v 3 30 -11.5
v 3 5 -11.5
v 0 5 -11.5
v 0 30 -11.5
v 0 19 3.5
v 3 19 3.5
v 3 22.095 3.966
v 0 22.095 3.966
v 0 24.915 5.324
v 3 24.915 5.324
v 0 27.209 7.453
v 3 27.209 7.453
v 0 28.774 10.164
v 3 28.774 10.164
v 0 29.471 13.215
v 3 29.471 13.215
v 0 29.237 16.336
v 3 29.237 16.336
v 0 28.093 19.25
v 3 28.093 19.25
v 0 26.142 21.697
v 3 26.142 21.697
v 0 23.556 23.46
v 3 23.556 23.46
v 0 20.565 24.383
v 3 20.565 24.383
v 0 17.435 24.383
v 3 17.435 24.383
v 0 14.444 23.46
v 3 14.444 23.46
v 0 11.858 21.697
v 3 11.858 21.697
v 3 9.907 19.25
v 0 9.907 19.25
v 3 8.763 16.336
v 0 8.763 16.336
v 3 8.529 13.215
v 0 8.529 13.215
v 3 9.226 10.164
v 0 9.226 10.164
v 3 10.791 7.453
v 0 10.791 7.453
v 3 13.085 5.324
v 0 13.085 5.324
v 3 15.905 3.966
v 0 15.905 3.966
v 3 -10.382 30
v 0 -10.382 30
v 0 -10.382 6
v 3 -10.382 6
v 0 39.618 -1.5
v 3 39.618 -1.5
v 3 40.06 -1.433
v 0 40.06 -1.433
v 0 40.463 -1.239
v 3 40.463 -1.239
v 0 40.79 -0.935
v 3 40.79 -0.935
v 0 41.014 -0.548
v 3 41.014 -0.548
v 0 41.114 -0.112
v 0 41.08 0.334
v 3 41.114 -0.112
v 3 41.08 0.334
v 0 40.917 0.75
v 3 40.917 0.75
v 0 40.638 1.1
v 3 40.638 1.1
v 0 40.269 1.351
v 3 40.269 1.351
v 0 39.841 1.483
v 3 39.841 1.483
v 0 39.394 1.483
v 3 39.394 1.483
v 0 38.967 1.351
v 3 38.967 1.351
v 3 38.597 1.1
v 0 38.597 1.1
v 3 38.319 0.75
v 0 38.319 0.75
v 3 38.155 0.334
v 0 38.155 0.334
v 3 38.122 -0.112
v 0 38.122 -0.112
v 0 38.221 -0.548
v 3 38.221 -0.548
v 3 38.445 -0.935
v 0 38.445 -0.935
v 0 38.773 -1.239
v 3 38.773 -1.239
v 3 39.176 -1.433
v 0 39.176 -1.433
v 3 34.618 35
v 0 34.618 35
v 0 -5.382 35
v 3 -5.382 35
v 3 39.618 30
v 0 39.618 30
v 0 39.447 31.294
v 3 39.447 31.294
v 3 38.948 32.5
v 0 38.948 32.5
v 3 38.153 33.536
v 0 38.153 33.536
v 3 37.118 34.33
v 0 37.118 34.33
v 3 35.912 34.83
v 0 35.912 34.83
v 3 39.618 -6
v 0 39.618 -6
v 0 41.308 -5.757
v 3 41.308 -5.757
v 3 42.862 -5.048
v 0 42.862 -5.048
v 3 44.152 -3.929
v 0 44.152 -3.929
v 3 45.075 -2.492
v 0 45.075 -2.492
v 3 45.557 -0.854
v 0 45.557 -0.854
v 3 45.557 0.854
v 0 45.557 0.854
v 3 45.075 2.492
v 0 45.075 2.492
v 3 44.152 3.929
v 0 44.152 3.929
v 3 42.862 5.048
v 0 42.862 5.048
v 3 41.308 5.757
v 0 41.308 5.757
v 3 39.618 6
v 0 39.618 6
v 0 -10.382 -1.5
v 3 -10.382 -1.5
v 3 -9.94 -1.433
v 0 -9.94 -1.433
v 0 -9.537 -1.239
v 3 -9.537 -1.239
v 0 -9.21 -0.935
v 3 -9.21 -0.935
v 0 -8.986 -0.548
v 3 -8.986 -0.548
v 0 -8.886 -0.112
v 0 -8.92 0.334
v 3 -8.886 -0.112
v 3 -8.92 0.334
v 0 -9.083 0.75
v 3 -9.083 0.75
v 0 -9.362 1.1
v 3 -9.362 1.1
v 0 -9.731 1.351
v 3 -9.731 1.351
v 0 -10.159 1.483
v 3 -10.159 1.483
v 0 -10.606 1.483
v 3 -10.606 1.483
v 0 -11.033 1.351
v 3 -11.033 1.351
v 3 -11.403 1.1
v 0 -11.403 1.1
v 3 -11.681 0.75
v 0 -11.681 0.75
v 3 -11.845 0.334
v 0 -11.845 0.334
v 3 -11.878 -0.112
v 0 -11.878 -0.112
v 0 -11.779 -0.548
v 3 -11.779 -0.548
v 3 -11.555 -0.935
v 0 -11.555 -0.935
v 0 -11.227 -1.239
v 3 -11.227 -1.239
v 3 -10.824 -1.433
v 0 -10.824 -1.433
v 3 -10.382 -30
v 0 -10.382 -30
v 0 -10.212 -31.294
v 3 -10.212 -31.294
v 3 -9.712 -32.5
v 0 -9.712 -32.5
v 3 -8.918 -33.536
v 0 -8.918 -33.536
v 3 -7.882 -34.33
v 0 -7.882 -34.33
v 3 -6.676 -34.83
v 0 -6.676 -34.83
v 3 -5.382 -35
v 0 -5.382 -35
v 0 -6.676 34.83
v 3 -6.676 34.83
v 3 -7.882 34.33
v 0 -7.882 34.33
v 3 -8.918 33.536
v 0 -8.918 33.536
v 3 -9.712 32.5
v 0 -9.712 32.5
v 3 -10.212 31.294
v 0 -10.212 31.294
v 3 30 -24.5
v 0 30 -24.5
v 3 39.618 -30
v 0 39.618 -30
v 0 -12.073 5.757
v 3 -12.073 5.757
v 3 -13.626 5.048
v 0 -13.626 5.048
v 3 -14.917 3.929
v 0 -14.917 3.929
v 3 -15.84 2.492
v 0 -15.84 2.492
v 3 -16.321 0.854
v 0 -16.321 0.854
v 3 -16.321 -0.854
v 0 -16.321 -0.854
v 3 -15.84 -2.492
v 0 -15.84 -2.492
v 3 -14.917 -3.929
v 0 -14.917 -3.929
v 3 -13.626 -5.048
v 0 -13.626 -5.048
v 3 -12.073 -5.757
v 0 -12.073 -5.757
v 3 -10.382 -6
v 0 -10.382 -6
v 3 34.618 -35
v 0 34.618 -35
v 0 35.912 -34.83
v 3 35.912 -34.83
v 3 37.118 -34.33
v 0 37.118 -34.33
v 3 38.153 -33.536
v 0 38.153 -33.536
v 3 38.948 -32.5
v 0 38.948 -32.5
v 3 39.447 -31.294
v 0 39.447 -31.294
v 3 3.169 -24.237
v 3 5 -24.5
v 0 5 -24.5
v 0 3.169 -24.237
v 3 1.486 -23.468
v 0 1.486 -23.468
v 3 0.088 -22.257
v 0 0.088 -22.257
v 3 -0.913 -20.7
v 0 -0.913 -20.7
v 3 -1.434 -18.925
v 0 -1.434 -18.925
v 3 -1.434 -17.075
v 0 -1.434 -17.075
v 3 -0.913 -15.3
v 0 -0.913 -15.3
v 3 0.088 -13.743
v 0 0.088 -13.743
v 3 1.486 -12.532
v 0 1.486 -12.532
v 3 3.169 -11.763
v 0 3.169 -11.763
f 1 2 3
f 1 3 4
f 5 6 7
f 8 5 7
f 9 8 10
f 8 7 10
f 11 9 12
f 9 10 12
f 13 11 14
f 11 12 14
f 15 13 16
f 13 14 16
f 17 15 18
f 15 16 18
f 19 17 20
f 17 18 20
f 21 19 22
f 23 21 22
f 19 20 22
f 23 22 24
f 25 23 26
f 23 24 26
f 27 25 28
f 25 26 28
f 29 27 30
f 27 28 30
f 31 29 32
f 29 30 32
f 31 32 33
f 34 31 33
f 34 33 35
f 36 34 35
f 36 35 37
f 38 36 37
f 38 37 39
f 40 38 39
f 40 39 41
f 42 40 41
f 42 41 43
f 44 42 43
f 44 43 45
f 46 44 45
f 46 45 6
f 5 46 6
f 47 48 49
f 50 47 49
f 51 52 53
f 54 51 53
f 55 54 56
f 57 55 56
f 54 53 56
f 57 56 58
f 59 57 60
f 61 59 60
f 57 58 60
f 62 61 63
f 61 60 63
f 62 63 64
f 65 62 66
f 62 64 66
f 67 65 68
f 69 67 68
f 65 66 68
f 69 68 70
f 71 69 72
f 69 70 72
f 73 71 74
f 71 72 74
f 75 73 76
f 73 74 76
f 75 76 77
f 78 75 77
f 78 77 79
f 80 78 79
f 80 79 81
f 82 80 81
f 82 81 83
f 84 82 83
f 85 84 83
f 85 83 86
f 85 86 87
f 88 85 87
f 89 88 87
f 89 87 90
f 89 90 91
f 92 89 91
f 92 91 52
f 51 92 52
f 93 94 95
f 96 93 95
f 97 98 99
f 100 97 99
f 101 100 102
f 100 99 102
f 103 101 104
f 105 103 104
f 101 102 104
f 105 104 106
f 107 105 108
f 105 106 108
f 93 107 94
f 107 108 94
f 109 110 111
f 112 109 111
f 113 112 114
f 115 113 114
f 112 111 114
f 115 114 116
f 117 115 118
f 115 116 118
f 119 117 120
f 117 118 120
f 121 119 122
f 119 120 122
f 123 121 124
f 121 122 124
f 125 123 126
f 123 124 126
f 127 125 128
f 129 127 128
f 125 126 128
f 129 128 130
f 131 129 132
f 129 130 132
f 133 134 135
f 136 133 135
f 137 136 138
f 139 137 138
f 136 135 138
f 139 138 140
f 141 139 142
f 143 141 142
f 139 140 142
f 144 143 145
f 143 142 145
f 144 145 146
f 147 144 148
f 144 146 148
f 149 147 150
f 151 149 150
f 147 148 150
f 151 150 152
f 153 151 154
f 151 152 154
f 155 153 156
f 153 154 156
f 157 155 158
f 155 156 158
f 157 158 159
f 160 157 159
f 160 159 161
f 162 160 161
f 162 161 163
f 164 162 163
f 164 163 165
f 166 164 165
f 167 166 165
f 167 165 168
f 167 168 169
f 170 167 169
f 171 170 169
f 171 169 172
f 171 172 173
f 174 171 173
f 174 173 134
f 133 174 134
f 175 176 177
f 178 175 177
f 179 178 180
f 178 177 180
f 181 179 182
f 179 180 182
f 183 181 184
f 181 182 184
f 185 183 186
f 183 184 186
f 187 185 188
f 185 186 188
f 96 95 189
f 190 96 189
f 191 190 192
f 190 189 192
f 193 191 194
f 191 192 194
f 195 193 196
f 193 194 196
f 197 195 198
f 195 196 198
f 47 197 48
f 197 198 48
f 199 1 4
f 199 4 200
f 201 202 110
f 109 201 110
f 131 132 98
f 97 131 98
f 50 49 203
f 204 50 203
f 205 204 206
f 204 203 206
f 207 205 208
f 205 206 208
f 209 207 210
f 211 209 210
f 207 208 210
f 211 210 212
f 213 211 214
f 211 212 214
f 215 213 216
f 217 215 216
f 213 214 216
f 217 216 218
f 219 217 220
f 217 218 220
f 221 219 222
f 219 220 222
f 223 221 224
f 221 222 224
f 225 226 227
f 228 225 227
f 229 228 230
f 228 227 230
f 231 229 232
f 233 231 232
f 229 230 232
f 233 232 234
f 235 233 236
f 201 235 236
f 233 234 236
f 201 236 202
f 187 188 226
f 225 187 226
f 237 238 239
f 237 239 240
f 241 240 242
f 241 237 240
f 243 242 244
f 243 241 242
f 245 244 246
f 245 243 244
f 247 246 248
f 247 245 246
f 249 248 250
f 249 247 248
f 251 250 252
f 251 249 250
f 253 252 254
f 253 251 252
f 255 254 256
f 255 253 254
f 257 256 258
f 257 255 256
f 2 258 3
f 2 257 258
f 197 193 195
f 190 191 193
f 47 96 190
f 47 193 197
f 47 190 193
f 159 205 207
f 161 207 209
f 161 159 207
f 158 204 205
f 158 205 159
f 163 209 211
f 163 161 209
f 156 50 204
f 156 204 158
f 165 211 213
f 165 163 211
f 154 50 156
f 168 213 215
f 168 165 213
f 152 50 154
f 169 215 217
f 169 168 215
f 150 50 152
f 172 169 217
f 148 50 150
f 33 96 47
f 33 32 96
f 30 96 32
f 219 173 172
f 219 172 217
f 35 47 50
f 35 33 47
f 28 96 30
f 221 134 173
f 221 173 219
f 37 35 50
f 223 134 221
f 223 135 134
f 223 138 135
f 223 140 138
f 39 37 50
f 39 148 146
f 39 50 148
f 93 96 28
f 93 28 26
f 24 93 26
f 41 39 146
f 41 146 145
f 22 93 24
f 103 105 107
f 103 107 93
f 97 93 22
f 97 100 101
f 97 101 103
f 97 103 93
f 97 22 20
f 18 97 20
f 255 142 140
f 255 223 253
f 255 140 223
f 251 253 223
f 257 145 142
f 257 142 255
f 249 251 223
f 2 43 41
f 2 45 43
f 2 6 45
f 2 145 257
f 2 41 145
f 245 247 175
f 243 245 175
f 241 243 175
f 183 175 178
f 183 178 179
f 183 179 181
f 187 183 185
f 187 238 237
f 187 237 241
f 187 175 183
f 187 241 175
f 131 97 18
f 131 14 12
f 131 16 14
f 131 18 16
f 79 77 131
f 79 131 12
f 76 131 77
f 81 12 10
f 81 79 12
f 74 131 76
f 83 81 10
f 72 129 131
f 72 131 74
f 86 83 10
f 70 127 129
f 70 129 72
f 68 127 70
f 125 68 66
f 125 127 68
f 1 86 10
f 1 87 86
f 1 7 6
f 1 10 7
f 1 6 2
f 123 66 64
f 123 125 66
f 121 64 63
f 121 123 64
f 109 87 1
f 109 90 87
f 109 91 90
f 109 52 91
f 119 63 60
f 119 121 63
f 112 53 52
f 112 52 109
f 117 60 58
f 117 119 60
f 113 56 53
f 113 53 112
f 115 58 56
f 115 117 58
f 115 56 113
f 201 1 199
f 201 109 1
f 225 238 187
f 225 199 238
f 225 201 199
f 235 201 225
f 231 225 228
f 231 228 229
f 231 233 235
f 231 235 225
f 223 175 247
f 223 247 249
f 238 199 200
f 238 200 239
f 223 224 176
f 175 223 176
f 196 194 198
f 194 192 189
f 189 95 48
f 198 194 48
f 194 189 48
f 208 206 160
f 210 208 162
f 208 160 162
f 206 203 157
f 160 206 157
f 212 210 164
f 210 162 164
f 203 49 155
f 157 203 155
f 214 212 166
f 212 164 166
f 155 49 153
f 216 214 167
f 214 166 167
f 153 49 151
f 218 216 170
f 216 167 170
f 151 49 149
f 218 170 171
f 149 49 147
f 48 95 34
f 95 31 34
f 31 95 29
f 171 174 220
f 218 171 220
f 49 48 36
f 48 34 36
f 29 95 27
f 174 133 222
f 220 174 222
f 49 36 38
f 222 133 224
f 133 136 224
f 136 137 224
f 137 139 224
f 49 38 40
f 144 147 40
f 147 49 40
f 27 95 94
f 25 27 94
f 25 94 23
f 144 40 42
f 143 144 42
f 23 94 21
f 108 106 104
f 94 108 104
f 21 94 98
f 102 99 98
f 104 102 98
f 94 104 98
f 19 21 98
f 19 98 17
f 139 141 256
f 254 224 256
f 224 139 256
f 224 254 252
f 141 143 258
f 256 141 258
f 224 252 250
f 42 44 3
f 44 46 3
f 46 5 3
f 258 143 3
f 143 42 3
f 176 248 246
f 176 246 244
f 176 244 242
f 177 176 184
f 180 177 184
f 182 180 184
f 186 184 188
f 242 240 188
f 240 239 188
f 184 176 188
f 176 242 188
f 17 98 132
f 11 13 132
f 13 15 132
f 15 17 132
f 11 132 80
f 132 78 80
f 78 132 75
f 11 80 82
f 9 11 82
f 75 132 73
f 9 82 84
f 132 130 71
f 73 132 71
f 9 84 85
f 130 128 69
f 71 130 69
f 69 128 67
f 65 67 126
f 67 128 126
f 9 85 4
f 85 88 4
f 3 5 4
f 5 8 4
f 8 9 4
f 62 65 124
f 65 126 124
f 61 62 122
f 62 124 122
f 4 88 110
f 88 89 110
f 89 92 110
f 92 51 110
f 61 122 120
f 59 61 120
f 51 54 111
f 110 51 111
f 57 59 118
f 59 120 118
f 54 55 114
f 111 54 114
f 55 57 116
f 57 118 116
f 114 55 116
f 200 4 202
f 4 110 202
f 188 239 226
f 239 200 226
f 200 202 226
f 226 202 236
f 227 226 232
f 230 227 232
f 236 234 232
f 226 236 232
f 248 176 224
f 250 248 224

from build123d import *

# Parameters (mm, degrees)
BOSS_EXTRUDE1_DEPTH = 3
SKETCH2_R           = 1.5
SKETCH2_R_2         = 10.5
CUT_EXTRUDE1_DEPTH  = 4


with BuildPart() as part:
    # Sketch1 → Boss-Extrude1 (new body)
    with BuildSketch(Plane(origin=(0, 0, 0), x_dir=(0, 0, -1), z_dir=(1, 0, 0))):
        with BuildLine():
            Line((35, -5.382304056), (35, 34.617695944))
            ThreePointArc((35, 34.617695944), (33.535533906, 38.15322985), (30, 39.617695944))
            Line((30, 39.617695944), (6, 39.617695944))
            ThreePointArc((6, 39.617695944), (0, 45.617695944), (-6, 39.617695944))
            Line((-6, 39.617695944), (-30, 39.617695944))
            ThreePointArc((-30, 39.617695944), (-33.535533906, 38.15322985), (-35, 34.617695944))
            Line((-35, 34.617695944), (-35, -5.382304056))
            ThreePointArc((-35, -5.382304056), (-33.535533906, -8.917837962), (-30, -10.382304056))
            Line((-30, -10.382304056), (-6, -10.382304056))
            ThreePointArc((-6, -10.382304056), (0, -16.382304056), (6, -10.382304056))
            Line((6, -10.382304056), (30, -10.382304056))
            ThreePointArc((30, -10.382304056), (33.535533906, -8.917837962), (35, -5.382304056))
        make_face()
    extrude(amount=BOSS_EXTRUDE1_DEPTH)

    # Sketch2 → Cut-Extrude1 (cut, through all)
    with BuildSketch(Plane(origin=(3, 0, 0), x_dir=(0, 0, -1), z_dir=(1, 0, 0))):
        with Locations((0, 39.617695944)):
            Circle(SKETCH2_R)
        with Locations((0, -10.382304056)):
            Circle(SKETCH2_R)
        with Locations((-14, 19)):
            Circle(SKETCH2_R_2)
        with BuildLine():
            Line((11.5, 30), (24.5, 30))
            Line((24.5, 30), (24.5, 5))
            ThreePointArc((24.5, 5), (18, -1.5), (11.5, 5))
            Line((11.5, 5), (11.5, 30))
        make_face()
    extrude(amount=-CUT_EXTRUDE1_DEPTH, mode=Mode.SUBTRACT)


solid = part.part
